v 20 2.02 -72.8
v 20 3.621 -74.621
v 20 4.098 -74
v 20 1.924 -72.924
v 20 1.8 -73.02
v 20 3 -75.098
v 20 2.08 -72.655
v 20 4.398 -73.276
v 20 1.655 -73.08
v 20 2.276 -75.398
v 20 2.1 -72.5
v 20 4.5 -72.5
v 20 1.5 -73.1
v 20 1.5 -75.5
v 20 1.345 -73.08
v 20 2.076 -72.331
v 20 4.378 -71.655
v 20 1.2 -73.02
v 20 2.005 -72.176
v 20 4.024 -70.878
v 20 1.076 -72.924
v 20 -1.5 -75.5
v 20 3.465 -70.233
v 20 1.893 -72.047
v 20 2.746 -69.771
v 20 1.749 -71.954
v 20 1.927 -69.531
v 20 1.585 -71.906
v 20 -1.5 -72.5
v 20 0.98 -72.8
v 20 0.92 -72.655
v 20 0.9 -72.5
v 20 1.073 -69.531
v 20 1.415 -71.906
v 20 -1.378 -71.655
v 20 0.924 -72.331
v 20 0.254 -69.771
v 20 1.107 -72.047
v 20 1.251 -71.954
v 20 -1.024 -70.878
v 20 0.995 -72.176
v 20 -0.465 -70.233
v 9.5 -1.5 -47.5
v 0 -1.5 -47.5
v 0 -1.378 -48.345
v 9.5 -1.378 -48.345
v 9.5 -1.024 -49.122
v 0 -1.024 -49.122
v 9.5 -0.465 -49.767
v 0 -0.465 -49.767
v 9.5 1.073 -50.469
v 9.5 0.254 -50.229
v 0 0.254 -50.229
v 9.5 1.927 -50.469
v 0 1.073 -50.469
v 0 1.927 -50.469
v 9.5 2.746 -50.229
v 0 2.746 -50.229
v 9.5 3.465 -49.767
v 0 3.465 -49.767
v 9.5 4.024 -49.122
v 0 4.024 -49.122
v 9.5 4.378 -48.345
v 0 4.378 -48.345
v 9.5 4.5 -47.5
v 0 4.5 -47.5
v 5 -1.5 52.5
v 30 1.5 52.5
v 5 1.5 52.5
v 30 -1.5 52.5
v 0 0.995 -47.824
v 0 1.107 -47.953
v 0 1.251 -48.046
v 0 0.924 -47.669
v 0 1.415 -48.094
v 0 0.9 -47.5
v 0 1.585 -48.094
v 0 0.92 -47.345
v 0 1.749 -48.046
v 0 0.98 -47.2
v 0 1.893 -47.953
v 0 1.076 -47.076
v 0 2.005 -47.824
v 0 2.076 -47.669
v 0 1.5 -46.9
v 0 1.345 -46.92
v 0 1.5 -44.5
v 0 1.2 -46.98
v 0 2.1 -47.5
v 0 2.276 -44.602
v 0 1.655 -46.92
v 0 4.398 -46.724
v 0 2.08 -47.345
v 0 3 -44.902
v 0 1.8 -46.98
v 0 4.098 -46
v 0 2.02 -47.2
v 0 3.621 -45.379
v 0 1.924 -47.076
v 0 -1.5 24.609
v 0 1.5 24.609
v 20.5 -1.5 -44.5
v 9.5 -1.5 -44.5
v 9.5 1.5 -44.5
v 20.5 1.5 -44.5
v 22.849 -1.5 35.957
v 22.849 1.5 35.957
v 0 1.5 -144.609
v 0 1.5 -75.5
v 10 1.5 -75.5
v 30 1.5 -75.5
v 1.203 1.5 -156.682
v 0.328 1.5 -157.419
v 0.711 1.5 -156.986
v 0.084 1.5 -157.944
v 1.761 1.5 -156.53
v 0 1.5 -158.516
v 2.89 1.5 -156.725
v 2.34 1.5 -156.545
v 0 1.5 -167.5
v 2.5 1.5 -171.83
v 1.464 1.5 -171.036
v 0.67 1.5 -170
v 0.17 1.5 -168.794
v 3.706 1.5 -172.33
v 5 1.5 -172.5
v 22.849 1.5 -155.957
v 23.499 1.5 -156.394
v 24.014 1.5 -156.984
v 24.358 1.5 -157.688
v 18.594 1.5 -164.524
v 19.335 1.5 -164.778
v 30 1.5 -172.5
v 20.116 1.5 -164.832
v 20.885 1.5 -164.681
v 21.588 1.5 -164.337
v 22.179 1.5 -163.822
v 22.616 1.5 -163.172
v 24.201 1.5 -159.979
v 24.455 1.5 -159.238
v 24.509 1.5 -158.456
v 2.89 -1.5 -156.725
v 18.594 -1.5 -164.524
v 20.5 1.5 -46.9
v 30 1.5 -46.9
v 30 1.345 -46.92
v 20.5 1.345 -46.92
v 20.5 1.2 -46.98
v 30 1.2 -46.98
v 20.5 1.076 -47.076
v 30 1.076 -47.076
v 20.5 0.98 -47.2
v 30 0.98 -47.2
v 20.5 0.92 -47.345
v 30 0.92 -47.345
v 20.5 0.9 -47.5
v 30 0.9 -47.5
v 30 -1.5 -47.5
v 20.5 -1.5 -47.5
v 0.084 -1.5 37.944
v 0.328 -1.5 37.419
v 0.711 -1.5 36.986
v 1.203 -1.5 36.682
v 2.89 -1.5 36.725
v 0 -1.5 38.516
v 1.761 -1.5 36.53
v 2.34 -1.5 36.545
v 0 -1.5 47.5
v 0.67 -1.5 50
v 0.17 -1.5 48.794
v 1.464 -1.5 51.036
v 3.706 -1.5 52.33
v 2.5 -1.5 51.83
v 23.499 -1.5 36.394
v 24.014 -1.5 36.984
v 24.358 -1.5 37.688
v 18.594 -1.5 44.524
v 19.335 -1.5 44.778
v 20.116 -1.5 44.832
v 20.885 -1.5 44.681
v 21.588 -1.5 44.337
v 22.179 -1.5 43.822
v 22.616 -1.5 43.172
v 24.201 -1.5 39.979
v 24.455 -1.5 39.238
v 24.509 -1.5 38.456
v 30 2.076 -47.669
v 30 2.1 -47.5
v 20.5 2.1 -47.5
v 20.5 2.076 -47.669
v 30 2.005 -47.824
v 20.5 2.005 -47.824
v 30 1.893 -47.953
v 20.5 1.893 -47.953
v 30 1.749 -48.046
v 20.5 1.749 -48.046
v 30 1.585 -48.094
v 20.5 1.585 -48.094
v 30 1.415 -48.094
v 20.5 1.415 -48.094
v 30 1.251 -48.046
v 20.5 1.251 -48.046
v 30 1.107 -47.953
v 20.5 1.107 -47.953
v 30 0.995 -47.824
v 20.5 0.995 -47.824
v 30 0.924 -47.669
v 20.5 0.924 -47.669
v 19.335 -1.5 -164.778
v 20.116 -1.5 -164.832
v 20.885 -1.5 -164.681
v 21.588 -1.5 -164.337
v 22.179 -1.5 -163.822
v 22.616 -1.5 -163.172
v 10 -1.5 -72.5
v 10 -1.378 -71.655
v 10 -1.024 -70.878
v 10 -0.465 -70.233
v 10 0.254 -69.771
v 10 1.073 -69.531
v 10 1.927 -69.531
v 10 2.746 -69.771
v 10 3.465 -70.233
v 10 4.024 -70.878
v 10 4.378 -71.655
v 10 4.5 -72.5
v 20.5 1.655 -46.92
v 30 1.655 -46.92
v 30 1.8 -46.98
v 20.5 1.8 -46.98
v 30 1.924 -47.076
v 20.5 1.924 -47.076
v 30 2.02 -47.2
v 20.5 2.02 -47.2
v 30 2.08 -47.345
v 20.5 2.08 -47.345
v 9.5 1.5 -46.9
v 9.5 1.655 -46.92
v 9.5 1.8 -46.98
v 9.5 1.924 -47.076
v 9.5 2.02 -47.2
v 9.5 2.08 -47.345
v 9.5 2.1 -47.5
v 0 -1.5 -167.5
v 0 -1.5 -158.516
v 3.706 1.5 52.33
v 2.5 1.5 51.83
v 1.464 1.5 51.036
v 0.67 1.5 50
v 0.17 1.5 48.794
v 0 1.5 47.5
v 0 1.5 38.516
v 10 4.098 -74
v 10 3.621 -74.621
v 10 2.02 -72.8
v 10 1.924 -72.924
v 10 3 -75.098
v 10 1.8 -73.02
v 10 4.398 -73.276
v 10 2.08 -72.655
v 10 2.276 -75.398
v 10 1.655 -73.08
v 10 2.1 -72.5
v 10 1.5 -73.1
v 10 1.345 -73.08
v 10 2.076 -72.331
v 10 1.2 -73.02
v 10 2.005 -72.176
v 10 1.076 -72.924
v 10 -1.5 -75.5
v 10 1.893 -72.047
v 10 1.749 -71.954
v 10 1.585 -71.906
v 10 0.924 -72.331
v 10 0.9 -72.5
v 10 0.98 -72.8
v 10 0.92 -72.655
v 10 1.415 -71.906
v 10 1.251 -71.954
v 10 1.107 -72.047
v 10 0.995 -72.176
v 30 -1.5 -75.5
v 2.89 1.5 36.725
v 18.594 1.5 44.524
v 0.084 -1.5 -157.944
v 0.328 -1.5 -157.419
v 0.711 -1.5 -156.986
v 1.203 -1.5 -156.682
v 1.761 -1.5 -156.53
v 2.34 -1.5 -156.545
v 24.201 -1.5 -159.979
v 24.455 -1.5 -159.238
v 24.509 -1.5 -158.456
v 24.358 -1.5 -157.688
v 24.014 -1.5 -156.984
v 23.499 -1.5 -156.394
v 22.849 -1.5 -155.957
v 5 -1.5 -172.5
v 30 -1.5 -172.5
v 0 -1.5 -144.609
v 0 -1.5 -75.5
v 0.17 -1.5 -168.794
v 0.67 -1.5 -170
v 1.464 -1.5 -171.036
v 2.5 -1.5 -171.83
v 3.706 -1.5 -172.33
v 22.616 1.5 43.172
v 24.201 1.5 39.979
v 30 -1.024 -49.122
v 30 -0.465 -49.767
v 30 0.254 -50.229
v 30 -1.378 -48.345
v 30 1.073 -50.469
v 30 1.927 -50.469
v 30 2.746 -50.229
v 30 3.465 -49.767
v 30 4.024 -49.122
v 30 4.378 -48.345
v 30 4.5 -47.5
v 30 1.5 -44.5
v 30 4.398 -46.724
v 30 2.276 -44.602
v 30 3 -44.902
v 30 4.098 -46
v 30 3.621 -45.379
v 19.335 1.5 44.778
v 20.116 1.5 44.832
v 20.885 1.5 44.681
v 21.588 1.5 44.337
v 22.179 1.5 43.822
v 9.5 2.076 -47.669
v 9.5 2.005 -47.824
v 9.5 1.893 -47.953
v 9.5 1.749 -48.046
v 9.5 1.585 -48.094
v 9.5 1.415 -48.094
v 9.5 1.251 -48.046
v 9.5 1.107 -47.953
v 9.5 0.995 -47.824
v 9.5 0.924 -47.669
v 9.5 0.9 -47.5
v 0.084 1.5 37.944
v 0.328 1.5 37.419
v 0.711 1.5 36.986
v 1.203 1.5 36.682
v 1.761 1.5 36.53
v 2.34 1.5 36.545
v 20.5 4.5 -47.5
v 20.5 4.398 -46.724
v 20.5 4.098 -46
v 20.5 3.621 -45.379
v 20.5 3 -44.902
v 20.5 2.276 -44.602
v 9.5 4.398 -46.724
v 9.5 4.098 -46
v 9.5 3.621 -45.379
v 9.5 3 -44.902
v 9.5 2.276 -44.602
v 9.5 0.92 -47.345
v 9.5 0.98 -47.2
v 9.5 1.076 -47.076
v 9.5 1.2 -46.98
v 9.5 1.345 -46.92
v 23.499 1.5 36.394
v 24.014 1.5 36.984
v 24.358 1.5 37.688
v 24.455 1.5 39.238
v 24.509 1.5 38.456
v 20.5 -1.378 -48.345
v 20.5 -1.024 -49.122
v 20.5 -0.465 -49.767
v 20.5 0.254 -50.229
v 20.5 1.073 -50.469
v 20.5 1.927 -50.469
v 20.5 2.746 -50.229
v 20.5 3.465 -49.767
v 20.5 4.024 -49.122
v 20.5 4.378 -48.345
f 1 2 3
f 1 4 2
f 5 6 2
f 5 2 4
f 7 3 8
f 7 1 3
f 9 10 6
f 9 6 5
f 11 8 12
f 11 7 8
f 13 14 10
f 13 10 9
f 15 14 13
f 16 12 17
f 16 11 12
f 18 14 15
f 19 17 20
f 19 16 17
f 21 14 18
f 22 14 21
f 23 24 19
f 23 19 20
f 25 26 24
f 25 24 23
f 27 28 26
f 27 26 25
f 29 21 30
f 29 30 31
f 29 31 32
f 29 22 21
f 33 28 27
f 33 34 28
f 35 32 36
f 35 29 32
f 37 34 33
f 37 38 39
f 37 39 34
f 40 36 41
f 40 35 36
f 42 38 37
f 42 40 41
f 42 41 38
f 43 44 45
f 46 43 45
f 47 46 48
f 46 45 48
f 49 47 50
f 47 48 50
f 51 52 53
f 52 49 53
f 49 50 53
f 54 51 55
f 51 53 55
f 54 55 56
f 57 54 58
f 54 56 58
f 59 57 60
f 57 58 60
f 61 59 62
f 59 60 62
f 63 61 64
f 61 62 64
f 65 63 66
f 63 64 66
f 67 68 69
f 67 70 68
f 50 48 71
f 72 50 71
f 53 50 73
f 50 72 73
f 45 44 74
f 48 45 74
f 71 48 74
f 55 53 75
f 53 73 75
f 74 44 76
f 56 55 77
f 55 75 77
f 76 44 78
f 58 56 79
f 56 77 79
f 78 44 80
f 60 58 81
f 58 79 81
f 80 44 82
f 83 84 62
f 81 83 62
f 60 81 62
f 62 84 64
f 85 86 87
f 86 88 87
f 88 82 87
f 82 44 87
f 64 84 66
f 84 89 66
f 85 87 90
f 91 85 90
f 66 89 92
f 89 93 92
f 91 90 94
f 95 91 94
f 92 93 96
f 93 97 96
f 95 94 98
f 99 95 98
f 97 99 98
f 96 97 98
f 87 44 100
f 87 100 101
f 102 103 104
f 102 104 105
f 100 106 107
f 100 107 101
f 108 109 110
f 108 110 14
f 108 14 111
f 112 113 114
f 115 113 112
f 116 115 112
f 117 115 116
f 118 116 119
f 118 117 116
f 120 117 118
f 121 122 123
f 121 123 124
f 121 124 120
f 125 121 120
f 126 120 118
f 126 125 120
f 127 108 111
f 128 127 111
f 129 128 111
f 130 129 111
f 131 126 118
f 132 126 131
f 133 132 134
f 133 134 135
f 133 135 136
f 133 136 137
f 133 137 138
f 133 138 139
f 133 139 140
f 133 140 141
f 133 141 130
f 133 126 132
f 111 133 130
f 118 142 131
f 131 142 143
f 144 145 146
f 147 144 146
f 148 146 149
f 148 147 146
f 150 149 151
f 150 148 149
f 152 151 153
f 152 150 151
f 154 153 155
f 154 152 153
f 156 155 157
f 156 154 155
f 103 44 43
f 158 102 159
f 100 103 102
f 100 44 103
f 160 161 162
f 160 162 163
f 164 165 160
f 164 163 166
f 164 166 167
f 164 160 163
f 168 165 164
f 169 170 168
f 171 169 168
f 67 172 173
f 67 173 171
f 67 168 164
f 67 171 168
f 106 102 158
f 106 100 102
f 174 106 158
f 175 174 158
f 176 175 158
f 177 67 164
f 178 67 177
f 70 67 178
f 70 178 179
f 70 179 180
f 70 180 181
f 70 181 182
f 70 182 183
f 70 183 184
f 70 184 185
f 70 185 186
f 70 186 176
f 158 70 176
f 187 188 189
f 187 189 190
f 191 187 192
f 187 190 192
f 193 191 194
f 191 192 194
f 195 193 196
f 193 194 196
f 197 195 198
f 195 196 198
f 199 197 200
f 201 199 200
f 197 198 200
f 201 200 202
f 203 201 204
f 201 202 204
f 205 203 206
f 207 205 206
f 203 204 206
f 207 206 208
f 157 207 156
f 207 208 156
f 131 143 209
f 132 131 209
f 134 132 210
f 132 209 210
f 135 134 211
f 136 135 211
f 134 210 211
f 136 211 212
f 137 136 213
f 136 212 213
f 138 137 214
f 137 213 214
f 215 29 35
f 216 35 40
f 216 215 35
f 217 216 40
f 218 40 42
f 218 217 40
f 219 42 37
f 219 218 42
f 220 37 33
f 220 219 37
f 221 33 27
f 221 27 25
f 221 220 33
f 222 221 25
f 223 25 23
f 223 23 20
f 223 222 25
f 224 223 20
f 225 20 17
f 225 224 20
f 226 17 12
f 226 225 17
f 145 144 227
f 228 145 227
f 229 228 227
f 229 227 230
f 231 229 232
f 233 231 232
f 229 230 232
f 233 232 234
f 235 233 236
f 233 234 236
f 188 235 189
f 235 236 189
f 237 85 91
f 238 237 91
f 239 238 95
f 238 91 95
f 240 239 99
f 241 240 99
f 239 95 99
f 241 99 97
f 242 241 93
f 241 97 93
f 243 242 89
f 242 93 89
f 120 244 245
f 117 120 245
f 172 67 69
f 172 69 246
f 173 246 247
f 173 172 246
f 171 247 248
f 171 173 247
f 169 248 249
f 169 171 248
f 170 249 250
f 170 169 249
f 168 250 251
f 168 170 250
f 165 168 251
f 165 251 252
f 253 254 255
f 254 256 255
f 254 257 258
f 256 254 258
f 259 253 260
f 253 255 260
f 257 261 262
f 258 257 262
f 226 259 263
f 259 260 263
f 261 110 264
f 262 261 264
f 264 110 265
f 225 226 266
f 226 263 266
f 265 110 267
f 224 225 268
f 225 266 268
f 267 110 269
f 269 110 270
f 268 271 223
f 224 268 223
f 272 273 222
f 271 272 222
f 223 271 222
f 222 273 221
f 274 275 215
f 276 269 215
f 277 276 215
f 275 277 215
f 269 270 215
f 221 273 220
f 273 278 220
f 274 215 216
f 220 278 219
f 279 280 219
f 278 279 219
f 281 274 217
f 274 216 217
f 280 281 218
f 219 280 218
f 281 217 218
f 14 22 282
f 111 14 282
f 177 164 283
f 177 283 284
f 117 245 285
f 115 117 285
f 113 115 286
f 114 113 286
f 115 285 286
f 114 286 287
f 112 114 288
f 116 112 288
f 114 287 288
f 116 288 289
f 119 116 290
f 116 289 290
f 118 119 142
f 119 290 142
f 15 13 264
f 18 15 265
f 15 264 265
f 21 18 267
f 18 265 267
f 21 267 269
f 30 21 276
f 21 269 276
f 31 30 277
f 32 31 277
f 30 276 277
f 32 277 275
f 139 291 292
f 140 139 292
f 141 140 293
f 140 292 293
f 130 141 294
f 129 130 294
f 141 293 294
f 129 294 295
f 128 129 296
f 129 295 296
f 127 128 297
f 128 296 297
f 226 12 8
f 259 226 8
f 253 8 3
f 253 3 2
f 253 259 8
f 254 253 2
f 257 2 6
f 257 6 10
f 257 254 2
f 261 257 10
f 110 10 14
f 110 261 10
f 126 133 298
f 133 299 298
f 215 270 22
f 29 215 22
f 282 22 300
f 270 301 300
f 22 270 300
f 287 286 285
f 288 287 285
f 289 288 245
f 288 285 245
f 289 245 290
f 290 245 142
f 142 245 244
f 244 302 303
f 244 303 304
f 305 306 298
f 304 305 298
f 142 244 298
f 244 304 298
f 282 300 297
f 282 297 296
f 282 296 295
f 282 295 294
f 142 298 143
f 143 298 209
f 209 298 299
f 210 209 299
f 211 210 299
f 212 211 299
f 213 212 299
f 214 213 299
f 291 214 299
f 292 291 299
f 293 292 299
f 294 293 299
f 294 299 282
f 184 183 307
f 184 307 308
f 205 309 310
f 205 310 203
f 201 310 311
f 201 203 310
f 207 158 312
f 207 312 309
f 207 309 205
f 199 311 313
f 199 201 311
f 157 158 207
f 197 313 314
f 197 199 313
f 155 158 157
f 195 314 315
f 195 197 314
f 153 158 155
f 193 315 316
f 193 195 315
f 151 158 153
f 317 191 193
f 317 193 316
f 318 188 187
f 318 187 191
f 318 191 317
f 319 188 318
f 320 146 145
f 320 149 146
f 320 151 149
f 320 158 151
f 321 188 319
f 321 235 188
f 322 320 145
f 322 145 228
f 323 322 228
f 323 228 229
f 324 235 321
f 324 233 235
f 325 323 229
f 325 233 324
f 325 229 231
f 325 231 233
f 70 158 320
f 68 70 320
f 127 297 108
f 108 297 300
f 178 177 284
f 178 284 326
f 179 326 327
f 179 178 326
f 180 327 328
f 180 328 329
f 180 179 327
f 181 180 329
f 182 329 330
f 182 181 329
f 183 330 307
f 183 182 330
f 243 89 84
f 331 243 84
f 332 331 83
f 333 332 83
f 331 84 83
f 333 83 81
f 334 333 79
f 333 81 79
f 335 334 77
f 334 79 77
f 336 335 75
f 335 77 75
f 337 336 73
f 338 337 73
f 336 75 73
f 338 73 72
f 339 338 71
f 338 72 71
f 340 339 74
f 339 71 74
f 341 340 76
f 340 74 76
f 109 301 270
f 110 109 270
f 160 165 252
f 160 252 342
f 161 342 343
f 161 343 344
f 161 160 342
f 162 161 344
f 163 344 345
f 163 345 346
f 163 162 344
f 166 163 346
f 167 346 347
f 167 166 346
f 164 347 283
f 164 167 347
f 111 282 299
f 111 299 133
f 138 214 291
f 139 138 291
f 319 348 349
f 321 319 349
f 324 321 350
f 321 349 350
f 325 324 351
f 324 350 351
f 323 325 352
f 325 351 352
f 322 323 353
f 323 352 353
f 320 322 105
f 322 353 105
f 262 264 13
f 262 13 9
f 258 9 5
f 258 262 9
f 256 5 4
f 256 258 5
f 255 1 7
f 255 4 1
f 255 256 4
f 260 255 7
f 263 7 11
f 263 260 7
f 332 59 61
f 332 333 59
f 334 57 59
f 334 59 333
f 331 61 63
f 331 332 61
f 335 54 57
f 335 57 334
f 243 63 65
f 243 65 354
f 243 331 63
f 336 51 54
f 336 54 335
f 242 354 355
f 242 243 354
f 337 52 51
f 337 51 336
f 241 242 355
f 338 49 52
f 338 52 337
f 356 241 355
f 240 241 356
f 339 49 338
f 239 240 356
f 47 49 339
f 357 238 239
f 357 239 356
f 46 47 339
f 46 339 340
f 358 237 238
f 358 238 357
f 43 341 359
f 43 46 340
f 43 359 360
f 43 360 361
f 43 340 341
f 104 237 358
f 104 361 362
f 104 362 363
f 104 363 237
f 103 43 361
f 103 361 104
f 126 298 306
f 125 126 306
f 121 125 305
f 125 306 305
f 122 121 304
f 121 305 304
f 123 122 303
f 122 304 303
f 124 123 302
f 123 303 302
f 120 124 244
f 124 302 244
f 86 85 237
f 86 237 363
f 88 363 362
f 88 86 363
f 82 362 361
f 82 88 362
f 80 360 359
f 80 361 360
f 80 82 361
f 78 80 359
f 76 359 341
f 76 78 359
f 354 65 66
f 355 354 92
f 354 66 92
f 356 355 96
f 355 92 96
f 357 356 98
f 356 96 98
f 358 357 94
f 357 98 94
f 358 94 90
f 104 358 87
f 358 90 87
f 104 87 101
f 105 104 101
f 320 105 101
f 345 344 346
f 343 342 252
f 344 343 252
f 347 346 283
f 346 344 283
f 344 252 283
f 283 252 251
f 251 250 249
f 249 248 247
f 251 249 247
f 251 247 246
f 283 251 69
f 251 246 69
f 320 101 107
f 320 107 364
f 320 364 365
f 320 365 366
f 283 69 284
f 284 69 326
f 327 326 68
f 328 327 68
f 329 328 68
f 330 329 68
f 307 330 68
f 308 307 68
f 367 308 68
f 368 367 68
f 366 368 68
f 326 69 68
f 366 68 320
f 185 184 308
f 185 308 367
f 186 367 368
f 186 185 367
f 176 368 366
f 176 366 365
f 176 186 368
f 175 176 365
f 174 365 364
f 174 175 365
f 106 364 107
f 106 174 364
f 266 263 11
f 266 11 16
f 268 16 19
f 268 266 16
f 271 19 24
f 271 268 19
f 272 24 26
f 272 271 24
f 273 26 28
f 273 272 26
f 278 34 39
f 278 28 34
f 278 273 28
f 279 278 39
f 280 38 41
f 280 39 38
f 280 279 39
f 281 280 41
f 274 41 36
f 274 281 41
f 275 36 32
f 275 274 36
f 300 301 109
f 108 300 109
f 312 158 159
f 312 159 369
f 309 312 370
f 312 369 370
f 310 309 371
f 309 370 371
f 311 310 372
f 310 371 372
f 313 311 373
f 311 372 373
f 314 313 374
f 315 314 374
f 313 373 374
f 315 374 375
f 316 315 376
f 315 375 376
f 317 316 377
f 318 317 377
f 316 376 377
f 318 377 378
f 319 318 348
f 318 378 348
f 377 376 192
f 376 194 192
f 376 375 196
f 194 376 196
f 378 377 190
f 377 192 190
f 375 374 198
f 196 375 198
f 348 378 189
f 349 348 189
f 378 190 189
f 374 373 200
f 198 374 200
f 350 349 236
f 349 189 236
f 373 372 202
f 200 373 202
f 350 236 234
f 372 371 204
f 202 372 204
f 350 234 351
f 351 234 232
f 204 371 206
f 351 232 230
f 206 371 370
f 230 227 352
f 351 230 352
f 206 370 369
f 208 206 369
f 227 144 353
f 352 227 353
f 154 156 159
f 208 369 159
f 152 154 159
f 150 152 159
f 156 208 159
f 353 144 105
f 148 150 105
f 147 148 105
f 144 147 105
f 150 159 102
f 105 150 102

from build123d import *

# Parameters (mm, degrees)
F1_DEPTH  = 1.5
F3_DEPTH  = 30
F4_DEPTH  = 30
F7_W      = 11
F7_H      = 6
F8_DEPTH  = 7
F9_W      = 10
F9_H      = 6
F10_DEPTH = 12.5
F11_W     = 10
F11_H     = 6
F12_DEPTH = 12.5


with BuildPart() as f1:
    # F0 (on Front) → F1 (new body, symmetric)
    with BuildSketch(Plane.XZ):
        with BuildLine():
            Line((30, 52.5), (5, 52.5))
            ThreePointArc((5, 52.5), (1.4644660941, 51.0355339059), (0, 47.5))
            Line((0, 47.5), (0, 38.5159408377))
            ThreePointArc((0, 38.5159408377), (0.9462520417, 36.8160540061), (2.8896152404, 36.7246885595))
            Line((2.8896152404, 36.7246885595), (18.5942382679, 44.5243001271))
            ThreePointArc((18.5942382679, 44.5243001271), (20.8849916238, 44.6809111126), (22.6155395457, 43.1718445704))
            Line((22.6155395457, 43.1718445704), (24.2014796028, 39.9785328875))
            ThreePointArc((24.2014796028, 39.9785328875), (24.3580905882, 37.6877795315), (22.849024046, 35.9572316097))
            Line((22.849024046, 35.9572316097), (0, 24.6093939733))
            Line((0, 24.6093939733), (0, -47.5))
            Line((0, -47.5), (30, -47.5))
            Line((30, -47.5), (30, 52.5))
        make_face()
    extrude(amount=F1_DEPTH, both=True)

    # F2 (on Right) → F3 (join)
    with BuildSketch(Plane.YZ):
        with BuildLine():
            Line((0.9, -47.5), (-1.5, -47.5))
            ThreePointArc((-1.5, -47.5), (1.5, -50.5), (4.5, -47.5))
            ThreePointArc((4.5, -47.5), (3.6213203436, -45.3786796564), (1.5, -44.5))
            Line((1.5, -44.5), (1.5, -46.9))
            ThreePointArc((1.5, -46.9), (1.9242640687, -47.0757359313), (2.1, -47.5))
            ThreePointArc((2.1, -47.5), (1.5, -48.1), (0.9, -47.5))
        make_face()
        with BuildLine():
            Line((-1.5, 24.6093939733), (-1.5, -47.5))
            ThreePointArc((-1.5, -47.5), (-0.6213203436, -45.3786796564), (1.5, -44.5))
            Line((1.5, -44.5), (1.5, 24.6093939733))
            Line((1.5, 24.6093939733), (-1.5, 24.6093939733))
        make_face()
        with BuildLine():
            ThreePointArc((1.5, -44.5), (-0.6213203436, -45.3786796564), (-1.5, -47.5))
            Line((-1.5, -47.5), (0.9, -47.5))
            ThreePointArc((0.9, -47.5), (1.0757359313, -47.0757359313), (1.5, -46.9))
            Line((1.5, -46.9), (1.5, -44.5))
        make_face()
    extrude(amount=F3_DEPTH)

    # F2 (on Right) → F4 (cut)
    with BuildSketch(Plane.YZ):
        with BuildLine():
            ThreePointArc((1.5, -46.9), (1.0757359313, -47.0757359313), (0.9, -47.5))
            Line((0.9, -47.5), (1.5, -47.5))
            Line((1.5, -47.5), (1.5, -46.9))
        make_face()
    extrude(amount=F4_DEPTH, mode=Mode.SUBTRACT)


with BuildPart() as f6_1:
    # F6: instance of F1
    add(f1.part.mirror(Plane.XY.offset(-60)))

    # F9 (on Front) → F10 (cut, symmetric)
    with BuildSketch(Plane.XZ):
        with Locations((5, -72.5)):
            Rectangle(F9_W, F9_H)
    extrude(amount=F10_DEPTH, both=True, mode=Mode.SUBTRACT)

    # F11 (on Front) → F12 (cut, symmetric)
    with BuildSketch(Plane.XZ):
        with Locations((25, -72.5)):
            Rectangle(F11_W, F11_H)
    extrude(amount=F12_DEPTH, both=True, mode=Mode.SUBTRACT)


with BuildPart() as f1_1:
    add(f1.part)

    # F7 (on Front) → F8 (cut, symmetric)
    with BuildSketch(Plane.XZ):
        with Locations((15, -47.5)):
            Rectangle(F7_W, F7_H)
    extrude(amount=F8_DEPTH, both=True, mode=Mode.SUBTRACT)


solid = Compound([f6_1.part, f1_1.part])
